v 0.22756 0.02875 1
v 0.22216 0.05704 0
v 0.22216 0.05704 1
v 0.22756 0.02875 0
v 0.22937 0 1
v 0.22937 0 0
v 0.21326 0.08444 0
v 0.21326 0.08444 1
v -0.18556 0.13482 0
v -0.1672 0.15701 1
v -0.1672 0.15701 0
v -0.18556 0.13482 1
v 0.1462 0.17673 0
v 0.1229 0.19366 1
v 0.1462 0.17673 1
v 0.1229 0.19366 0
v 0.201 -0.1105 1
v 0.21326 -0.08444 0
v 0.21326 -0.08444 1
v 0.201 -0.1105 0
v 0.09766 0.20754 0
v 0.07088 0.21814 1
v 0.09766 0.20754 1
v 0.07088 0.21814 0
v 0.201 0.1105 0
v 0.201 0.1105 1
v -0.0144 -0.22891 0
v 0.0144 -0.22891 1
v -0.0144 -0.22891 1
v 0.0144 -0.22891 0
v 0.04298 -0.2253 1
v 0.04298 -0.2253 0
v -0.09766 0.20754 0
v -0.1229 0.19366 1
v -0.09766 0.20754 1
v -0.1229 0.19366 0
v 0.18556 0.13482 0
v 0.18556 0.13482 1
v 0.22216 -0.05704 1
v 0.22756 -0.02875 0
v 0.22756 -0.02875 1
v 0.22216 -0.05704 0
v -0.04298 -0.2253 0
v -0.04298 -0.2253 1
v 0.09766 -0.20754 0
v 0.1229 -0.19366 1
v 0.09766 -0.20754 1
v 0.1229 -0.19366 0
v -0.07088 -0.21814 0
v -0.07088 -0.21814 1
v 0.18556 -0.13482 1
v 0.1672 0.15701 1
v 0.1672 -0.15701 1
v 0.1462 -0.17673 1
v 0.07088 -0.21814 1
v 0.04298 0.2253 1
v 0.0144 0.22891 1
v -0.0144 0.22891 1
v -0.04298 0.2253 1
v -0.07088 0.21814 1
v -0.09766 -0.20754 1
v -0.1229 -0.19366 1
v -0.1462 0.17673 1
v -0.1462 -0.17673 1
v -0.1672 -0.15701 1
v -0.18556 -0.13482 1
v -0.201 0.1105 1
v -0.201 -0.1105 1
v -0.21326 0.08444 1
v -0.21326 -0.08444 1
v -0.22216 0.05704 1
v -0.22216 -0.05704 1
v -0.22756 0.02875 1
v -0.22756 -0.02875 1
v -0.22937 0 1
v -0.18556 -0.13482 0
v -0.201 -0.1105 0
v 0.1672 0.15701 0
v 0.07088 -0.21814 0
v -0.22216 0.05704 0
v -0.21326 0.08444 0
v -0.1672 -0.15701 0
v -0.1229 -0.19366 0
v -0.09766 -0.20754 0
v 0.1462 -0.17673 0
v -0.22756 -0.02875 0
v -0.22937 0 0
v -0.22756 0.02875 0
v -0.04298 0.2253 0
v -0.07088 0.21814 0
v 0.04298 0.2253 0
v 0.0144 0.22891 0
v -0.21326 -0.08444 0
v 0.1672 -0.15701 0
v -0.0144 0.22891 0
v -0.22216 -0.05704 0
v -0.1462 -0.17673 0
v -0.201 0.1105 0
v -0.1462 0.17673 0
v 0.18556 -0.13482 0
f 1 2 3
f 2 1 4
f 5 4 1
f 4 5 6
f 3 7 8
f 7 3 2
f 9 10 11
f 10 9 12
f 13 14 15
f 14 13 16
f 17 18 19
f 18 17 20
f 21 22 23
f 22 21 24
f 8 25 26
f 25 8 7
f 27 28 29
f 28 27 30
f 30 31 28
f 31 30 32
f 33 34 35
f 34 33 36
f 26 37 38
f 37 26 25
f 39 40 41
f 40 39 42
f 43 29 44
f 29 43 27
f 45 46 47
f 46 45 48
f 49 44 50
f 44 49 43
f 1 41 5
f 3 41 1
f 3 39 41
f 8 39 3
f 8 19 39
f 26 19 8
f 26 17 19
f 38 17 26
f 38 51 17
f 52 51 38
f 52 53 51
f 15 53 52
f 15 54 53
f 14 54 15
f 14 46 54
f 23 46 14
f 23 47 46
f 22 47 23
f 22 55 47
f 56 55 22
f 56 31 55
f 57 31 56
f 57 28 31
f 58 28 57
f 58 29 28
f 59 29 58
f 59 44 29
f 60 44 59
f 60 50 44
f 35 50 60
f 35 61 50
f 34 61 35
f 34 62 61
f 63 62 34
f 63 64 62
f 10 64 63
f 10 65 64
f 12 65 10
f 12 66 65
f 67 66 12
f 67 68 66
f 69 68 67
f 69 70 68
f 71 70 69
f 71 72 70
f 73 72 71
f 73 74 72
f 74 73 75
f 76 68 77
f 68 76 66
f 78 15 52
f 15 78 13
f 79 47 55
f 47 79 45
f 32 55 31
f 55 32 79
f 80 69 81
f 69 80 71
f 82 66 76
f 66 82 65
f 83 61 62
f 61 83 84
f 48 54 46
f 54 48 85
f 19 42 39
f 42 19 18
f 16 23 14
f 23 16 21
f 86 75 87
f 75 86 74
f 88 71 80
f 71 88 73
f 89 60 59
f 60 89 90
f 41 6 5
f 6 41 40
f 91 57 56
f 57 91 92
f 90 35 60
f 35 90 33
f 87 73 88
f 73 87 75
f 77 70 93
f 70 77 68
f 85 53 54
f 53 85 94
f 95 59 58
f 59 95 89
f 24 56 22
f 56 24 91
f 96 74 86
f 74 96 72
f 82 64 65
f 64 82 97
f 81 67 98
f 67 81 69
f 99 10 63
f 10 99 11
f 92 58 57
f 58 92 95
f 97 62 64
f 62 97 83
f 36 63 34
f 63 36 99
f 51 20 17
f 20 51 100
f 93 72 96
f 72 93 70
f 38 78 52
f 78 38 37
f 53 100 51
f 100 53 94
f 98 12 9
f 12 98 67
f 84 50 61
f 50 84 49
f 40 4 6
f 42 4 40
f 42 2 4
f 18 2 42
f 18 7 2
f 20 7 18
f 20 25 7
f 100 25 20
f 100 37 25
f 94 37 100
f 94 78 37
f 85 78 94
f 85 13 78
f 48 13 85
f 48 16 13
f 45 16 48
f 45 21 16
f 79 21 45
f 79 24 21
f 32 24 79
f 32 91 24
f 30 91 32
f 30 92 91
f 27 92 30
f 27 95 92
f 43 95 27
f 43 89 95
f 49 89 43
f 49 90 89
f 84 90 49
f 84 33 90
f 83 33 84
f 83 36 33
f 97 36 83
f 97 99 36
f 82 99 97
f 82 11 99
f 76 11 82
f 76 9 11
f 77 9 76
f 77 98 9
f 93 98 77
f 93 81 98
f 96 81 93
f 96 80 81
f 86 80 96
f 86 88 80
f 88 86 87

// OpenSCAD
//=============================================================================
// iso-threads.scad
//
// Metric ISO Threads
//=============================================================================
// Written in 2017 by Patrick Barrett
//
// To the extent possible under law, the author(s) have dedicated all copyright
// and related and neighboring rights to this work to the public domain
// worldwide. This work is distributed without any warranty.
//
// See <http://creativecommons.org/publicdomain/zero/1.0/> for full dedication.
//=============================================================================

//=============================================================================
// dimensions
//=============================================================================

$fn = 50;
abit = 0.01;

//=============================================================================
// module
//=============================================================================
    
module thread_unit(d,p) {
    h = sqrt(3)/2 * p;
    t = 360/$fn;
    // point, outter (incl full thread point)
    d_pto = d + 2*(1/8)*h;
    // point, inner (incl full thread point)
    d_pti = d - 2*(7/8)*h;
    // inner
    d_i = (d - 2*(7/8)*h) - 2;
    
    a = t; // angle
    ho = (p/$fn);//*i; // height offset (of bottom)
    points = [
        [d_i/2 * cos(0), d_i/2 * sin(0), p],            // inner top
        [d_pti/2 * cos(0), d_pti/2 * sin(0), p],        // face top
        [d_pto/2 * cos(0), d_pto/2 * sin(0), p/2],      // face middle
        [d_pti/2 * cos(0), d_pti/2 * sin(0), 0],        // face bottom
        [d_i/2 * cos(0), d_i/2 * sin(0), 0],            // inner bottom
        [d_i/2 * cos(a), d_i/2 * sin(a), ho + p],       // inner top
        [d_pti/2 * cos(a), d_pti/2 * sin(a), ho + p],   // face top
        [d_pto/2 * cos(a), d_pto/2 * sin(a), ho + p/2], // face middle
        [d_pti/2 * cos(a), d_pti/2 * sin(a), ho + 0],   // face bottom
        [d_i/2 * cos(a), d_i/2 * sin(a), ho + 0],       // inner bottom
    ];

    itp = 0;  // inner,  top,    previous 
    ftp = 1;  // face,   top,    previous
    fmp = 2;  // face,   middle, previous
    fbp = 3;  // face,   bottom, previous
    ibp = 4;  // inner,  bottom, previous
    itc = 5;  // inner,  bottom, current
    ftc = 6;  // face,   top,    current
    fmc = 7;  // face,   middle, current
    fbc = 8;  // face,   bottom, current
    ibc = 9; //  inner,  bottom, current 
    
    faces = [
        [itp, ftp, fmp, fbp, ibp], // previous face
        [ibp, fbp, fbc, ibc],      // bottom
        [fmp, fmc, fbc, fbp],      // thread face, bottom
        [ftp, ftc, fmc, fmp],      // thread face, top
        [itc, ftc, ftp, itp],      // top
        [ibc, fbc, fmc, ftc, itc], // current face
        [itp, ibp, ibc, itc],      // inner
    ];
    
    polyhedron(
        points = points,
        faces = faces
    );
}

module thread_by_union(diameter, pitch, length) {
    h = sqrt(3)/2 * pitch;
    d_min = diameter - 2*(5/8)*h;
    d_maj = diameter;
    
    intersection(){
        union(){
            for (i = [-$fn:(length/pitch)*$fn]) {
                translate([0,0,(pitch/$fn) * i])
                rotate([0,0,360/$fn * i])
                thread_unit(diameter,pitch);
            }
            
            translate([0,0,-pitch])
            cylinder(d = d_min, h = length + (pitch));
        }
        cylinder(d = d_maj, h = length);
    }
}

//=============================================================================
// main soild
//=============================================================================

thread_by_union(1, 0.5, 1);
